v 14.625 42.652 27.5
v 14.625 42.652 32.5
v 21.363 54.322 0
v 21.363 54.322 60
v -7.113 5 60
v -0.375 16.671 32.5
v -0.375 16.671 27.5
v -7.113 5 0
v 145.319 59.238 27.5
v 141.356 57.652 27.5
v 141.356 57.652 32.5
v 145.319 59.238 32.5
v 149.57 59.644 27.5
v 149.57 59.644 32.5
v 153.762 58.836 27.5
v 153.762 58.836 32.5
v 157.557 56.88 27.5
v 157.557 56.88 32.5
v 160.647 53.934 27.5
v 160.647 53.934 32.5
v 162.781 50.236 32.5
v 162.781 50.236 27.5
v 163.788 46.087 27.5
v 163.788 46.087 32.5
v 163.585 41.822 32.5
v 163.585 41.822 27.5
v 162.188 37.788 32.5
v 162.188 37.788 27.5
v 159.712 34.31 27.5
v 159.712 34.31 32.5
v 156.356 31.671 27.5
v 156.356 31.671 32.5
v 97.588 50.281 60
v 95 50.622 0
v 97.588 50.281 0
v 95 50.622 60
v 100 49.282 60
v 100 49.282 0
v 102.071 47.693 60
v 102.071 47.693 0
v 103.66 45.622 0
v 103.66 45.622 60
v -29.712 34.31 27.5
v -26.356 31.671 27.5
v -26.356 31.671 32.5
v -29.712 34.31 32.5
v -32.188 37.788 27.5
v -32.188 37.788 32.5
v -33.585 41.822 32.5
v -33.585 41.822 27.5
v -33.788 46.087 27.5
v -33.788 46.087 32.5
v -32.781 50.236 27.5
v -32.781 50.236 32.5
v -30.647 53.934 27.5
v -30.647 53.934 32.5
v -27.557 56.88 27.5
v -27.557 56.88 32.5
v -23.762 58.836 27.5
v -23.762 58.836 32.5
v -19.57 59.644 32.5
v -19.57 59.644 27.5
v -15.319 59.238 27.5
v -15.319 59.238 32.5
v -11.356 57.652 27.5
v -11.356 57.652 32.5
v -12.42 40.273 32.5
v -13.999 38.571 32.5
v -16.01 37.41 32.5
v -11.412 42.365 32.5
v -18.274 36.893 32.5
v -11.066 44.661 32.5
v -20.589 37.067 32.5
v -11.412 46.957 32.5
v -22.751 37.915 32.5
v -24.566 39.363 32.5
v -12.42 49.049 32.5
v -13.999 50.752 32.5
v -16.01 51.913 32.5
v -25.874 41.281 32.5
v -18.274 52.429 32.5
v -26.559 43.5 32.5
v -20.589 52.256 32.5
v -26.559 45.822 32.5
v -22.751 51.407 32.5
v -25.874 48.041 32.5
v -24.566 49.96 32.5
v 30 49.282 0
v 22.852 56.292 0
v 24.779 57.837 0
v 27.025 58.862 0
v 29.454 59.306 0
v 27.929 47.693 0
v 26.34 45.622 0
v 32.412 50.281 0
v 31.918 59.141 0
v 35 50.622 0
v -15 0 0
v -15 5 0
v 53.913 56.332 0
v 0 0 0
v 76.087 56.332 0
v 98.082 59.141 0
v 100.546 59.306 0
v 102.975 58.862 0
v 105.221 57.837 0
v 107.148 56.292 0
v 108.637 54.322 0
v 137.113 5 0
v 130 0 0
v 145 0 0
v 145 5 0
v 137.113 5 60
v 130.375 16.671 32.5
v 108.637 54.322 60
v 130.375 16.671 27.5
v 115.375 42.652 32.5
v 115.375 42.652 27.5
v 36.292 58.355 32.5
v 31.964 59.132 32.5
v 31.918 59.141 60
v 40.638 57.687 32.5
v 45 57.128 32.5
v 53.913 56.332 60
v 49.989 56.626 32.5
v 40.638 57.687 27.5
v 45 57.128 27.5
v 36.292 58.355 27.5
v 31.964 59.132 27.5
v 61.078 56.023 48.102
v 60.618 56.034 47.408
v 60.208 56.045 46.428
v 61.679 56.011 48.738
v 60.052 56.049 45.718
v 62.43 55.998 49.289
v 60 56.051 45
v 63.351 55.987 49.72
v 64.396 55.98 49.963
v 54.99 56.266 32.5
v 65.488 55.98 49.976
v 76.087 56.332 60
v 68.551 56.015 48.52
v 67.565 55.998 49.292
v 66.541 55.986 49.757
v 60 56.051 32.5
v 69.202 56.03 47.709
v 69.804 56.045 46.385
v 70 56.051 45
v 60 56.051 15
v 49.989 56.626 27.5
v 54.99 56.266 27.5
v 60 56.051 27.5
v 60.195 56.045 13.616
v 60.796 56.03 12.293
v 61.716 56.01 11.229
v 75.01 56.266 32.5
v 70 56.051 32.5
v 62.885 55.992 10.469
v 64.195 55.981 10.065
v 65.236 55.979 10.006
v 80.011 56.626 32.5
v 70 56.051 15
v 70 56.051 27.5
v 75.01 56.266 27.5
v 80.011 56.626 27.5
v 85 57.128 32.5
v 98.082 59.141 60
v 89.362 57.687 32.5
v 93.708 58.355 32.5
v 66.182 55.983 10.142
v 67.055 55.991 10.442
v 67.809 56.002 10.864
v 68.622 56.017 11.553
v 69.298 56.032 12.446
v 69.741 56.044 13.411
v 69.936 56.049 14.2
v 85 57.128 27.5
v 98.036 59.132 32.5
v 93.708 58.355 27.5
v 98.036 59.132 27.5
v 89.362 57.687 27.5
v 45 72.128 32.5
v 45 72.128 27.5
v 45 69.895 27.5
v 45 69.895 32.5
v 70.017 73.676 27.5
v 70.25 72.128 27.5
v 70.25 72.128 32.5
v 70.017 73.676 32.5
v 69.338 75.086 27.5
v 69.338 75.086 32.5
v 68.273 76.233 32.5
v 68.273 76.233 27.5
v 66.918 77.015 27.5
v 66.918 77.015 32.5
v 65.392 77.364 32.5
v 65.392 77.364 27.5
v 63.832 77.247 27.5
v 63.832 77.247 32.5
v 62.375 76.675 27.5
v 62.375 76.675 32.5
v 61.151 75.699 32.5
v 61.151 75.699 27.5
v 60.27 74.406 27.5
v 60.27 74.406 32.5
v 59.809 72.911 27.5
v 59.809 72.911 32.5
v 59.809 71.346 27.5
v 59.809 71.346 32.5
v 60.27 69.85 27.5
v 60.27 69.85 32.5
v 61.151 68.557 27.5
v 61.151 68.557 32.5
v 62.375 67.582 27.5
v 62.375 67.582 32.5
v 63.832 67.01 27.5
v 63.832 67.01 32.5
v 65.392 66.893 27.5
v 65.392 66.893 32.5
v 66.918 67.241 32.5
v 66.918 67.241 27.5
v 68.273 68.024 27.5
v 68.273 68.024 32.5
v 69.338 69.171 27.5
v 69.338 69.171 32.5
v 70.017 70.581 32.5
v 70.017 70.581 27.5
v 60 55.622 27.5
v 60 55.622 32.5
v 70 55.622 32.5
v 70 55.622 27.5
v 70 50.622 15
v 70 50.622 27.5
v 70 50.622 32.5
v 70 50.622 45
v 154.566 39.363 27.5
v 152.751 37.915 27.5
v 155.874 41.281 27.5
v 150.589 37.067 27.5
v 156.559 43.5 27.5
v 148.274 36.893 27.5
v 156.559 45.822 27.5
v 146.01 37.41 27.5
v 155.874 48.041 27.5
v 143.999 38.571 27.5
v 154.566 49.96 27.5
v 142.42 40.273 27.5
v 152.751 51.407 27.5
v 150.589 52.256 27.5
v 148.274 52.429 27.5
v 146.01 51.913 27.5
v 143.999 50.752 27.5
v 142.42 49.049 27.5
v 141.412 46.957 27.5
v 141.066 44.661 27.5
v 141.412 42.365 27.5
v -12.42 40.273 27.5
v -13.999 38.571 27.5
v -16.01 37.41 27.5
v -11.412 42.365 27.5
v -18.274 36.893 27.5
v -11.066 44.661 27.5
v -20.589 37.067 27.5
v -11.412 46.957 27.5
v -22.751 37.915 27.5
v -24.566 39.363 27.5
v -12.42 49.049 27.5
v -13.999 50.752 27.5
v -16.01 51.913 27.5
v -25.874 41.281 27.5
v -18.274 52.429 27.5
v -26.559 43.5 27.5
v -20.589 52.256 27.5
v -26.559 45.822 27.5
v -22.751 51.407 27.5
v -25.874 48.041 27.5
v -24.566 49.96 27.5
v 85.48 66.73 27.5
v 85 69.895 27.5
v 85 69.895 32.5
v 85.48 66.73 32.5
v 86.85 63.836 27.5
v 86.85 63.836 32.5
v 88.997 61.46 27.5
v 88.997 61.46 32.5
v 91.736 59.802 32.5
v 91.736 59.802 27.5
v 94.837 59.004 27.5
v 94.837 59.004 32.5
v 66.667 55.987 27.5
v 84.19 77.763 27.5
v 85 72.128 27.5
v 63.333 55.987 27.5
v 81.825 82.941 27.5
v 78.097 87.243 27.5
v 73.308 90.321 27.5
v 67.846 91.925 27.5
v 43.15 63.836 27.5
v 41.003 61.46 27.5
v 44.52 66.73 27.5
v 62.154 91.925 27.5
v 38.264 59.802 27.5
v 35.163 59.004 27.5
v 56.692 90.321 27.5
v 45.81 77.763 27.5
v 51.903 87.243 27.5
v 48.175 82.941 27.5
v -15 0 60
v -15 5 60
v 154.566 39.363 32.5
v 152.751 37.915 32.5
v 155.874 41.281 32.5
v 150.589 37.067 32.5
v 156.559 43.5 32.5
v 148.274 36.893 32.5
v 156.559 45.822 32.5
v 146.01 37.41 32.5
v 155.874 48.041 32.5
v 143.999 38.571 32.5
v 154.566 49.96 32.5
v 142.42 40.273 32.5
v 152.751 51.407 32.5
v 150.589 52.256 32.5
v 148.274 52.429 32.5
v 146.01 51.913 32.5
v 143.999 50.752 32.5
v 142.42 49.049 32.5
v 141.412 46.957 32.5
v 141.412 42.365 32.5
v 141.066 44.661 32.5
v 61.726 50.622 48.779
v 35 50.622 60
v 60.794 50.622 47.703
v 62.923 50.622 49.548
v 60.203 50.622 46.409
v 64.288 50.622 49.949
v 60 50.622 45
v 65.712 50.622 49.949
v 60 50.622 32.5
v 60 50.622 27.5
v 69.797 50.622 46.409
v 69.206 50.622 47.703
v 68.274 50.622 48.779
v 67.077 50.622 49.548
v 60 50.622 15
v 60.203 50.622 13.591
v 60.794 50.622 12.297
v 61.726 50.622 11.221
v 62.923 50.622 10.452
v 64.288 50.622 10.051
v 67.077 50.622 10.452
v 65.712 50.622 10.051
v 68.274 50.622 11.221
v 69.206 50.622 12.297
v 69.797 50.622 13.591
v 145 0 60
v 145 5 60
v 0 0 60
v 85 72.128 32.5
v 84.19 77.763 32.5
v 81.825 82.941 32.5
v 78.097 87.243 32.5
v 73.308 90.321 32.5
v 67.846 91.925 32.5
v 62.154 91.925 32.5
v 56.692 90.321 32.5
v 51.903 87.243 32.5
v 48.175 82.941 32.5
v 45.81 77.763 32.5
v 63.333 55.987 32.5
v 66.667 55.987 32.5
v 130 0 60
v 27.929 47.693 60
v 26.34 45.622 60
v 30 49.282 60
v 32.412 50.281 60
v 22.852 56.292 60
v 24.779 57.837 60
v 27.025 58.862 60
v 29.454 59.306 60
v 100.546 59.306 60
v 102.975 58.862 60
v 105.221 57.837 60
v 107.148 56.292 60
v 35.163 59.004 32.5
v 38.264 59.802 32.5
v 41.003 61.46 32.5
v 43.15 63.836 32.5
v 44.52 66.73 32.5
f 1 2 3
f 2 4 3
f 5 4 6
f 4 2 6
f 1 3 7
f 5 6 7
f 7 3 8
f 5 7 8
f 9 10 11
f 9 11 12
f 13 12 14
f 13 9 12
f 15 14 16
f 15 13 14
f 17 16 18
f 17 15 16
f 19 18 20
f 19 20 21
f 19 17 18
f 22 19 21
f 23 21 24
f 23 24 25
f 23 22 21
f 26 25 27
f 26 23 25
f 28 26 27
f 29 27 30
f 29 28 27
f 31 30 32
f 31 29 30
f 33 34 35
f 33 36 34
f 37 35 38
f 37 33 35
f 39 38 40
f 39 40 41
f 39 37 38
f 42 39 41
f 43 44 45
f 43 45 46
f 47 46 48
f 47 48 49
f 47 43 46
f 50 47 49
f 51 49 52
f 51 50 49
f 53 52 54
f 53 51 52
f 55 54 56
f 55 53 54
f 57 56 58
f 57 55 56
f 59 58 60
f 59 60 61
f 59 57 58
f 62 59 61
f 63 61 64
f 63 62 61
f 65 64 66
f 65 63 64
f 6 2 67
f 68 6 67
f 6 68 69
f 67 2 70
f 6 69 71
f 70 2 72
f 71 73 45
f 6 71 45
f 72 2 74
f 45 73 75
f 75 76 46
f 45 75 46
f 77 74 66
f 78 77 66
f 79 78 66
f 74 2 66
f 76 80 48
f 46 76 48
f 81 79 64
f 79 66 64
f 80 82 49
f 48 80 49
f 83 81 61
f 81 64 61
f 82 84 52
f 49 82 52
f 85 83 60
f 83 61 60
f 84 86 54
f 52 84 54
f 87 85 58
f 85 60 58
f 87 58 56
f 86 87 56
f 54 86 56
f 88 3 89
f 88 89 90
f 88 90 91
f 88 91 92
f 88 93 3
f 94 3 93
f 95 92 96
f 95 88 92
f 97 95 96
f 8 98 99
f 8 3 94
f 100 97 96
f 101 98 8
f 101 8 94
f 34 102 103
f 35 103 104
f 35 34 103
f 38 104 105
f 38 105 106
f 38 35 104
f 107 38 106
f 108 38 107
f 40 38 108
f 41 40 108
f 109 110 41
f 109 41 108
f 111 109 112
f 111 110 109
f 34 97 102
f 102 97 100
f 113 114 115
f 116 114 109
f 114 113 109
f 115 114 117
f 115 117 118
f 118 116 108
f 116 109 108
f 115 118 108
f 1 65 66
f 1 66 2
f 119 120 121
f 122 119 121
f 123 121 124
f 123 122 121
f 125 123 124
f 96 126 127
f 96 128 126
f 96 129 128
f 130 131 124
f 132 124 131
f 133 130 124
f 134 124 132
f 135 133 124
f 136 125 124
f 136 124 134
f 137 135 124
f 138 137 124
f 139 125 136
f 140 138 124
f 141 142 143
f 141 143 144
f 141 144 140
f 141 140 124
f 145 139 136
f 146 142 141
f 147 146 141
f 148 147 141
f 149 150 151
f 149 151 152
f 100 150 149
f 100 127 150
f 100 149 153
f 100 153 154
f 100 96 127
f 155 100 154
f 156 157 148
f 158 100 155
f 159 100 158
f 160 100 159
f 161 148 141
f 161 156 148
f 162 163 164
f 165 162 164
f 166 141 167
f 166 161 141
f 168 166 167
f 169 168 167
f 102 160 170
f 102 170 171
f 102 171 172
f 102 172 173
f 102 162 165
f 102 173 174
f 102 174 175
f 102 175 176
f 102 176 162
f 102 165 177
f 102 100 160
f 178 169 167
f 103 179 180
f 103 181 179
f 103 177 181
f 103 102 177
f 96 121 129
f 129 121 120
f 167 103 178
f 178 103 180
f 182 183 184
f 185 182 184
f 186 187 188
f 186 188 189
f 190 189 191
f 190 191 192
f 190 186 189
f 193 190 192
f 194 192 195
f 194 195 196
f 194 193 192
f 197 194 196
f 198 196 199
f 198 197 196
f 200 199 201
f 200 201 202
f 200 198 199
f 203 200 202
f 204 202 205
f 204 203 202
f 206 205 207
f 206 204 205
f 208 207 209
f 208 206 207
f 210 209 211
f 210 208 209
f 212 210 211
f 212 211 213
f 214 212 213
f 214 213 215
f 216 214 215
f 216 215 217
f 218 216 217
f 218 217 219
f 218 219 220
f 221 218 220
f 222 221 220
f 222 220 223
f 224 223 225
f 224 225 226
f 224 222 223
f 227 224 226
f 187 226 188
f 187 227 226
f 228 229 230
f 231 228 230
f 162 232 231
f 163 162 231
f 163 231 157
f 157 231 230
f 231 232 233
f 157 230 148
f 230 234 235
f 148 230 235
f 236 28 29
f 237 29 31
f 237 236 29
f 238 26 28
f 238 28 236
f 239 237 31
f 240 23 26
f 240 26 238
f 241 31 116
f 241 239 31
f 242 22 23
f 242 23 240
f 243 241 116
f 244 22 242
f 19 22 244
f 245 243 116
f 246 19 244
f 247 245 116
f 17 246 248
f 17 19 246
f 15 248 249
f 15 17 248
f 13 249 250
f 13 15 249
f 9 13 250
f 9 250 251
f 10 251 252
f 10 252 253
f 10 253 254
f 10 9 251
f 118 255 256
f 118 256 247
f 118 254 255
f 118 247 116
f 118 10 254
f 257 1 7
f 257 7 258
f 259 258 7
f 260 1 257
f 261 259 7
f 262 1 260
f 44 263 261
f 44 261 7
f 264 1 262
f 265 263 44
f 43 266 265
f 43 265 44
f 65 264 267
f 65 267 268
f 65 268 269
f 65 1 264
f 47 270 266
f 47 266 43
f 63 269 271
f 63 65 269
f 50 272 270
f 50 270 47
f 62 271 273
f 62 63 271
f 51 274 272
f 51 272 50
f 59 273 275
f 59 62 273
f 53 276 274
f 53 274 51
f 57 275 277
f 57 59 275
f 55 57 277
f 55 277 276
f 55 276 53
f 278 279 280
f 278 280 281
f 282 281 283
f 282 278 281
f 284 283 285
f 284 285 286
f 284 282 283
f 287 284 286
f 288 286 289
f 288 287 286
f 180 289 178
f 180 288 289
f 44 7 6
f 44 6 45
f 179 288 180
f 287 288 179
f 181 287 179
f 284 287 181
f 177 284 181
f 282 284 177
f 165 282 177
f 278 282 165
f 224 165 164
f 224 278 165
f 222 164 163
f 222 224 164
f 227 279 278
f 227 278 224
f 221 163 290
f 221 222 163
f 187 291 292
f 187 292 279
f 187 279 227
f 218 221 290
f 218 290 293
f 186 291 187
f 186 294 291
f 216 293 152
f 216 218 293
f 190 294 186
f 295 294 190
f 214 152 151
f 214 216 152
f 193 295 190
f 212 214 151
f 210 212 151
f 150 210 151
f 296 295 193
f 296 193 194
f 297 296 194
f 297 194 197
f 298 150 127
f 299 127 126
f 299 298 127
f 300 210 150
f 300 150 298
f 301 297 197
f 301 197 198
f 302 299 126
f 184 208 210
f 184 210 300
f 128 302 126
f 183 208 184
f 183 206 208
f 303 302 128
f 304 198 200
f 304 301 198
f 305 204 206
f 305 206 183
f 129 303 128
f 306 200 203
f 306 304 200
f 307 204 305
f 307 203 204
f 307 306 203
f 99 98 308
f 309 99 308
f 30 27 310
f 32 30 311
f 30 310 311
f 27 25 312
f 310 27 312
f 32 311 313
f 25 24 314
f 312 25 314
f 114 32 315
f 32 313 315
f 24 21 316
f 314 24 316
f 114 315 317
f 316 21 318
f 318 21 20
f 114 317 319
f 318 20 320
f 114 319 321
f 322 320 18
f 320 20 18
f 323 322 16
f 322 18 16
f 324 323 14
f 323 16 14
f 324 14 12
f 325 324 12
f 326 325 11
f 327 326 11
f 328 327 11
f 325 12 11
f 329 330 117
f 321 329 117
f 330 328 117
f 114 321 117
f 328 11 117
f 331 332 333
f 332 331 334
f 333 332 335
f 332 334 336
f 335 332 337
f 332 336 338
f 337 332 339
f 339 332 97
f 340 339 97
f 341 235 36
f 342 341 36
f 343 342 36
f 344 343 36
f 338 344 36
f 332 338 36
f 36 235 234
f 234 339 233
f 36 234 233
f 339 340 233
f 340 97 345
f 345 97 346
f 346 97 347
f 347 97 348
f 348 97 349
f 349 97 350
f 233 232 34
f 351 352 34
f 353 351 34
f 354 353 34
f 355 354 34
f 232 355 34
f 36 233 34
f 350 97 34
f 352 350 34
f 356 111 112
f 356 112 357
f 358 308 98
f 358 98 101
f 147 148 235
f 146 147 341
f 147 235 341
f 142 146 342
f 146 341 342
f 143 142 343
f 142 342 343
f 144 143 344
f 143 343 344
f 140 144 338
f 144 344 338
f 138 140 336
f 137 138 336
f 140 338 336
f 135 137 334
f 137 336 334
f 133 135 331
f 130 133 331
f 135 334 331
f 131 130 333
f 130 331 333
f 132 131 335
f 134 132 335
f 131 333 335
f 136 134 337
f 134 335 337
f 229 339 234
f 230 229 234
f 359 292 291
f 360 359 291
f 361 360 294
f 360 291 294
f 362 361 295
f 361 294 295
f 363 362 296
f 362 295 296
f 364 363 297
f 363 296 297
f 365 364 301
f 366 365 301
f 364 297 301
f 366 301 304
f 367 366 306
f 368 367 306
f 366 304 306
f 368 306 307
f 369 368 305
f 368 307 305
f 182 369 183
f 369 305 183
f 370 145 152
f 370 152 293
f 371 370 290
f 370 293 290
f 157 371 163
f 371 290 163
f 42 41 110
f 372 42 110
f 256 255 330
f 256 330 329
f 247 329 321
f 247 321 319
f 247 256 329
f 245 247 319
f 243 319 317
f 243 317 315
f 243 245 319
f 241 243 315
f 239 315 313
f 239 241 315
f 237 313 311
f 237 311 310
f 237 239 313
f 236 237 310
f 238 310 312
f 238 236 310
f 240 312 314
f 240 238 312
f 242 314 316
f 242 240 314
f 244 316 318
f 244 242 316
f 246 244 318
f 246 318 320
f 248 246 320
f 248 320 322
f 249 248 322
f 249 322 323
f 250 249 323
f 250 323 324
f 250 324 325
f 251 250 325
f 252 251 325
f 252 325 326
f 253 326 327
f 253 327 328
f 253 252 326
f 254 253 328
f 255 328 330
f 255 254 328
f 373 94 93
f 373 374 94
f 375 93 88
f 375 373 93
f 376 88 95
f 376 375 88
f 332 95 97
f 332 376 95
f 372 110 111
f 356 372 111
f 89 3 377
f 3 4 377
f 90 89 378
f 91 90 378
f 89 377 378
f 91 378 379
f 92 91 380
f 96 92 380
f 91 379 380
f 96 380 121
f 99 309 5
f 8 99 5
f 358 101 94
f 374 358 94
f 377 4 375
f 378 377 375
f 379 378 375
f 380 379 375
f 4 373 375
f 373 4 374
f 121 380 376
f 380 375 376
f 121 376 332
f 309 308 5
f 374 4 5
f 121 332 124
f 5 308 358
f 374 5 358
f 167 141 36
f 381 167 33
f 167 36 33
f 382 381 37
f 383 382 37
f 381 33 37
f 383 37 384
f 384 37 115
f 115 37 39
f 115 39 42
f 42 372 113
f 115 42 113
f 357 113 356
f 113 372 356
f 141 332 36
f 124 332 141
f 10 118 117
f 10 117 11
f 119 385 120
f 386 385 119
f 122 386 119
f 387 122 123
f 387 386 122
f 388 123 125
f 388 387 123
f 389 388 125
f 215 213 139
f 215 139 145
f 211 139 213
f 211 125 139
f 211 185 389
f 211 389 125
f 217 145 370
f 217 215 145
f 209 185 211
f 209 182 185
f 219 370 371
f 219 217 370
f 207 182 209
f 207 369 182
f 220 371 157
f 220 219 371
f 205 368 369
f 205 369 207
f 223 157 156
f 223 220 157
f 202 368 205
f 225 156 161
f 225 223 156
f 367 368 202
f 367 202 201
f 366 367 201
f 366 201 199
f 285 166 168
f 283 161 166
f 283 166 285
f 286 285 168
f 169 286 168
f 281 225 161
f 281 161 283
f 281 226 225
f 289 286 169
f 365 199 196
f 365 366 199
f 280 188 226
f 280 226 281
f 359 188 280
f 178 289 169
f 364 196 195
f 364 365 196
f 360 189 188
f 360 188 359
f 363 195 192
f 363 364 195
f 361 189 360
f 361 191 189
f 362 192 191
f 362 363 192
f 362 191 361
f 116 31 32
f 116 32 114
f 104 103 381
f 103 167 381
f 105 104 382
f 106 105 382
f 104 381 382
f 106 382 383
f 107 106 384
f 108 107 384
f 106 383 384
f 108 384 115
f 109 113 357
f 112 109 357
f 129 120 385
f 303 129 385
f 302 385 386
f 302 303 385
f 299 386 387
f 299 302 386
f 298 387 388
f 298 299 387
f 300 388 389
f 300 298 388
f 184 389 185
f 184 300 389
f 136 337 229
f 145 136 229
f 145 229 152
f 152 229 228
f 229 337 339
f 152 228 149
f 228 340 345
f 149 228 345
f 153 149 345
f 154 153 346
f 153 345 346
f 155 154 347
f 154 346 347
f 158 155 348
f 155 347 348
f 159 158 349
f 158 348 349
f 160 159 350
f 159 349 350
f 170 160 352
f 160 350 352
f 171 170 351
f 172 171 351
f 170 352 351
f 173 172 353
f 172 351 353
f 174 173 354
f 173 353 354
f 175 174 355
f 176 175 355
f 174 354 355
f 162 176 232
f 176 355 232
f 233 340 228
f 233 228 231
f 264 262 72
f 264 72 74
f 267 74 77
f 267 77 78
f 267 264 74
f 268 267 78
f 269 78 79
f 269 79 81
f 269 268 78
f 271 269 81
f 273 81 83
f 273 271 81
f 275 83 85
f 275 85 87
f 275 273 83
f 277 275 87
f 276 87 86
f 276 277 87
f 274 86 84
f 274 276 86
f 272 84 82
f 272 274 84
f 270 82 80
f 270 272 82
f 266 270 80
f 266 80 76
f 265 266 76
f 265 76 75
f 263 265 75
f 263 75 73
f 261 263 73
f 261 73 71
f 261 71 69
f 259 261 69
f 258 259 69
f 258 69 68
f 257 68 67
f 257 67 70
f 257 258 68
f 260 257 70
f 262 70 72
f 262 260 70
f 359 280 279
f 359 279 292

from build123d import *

# Parameters (mm, degrees)
BOSS_EXTRU_1_DEPTH      = 60
ENL_V_MAT_EXTRU_1_DEPTH = 60
CONG_1_R                = 10
ENL_V_MAT_EXTRU_2_DEPTH = 60
CONG_2_R                = 10
ESQUISSE4_W             = 15
ESQUISSE4_H             = 60
BOSS_EXTRU_2_DEPTH      = 5
BOSS_EXTRU_3_START      = -32.5
ESQUISSE5_R             = 7.789836859
ESQUISSE5_R_2           = 5.25
BOSS_EXTRU_3_DEPTH      = 5
ESQUISSE6_W             = 10
ESQUISSE6_H             = 5
BOSS_EXTRU_4_DEPTH      = 5
CONG_3_R                = 11


with BuildPart() as part:
    # Esquisse1 → Boss.-Extru.1 (new body)
    with BuildSketch(Plane.XY):
        Polygon((0, 0), (29.226497308, 50.621778265), (100.773502692, 50.621778265), (130, 0), (140, 0), (105, 60.621778265), (25, 60.621778265), (-10, 0), align=None)
    extrude(amount=BOSS_EXTRU_1_DEPTH)

    # Esquisse2 → Enlèv. mat.-Extru.1 (cut)
    with BuildSketch(Plane(origin=(0, 0, 0), x_dir=(-1, 0, 0), z_dir=(0, 0, -1))):
        with BuildLine():
            Line((-105, 60.621778265), (-25, 60.621778265))
            ThreePointArc((-25, 60.621778265), (-65, 55.979286299), (-105, 60.621778265))
        make_face()
    extrude(amount=-ENL_V_MAT_EXTRU_1_DEPTH, mode=Mode.SUBTRACT)

    # Congé1
    cong_1_edges = [part.edges().sort_by_distance(p)[0] for p in [
        (25, 60.621778265, 30),
        (105, 60.621778265, 30),
    ]]
    fillet(cong_1_edges, radius=CONG_1_R)

    # Esquisse3 → Enlèv. mat.-Extru.2 (cut)
    with BuildSketch(Plane(origin=(0, 0, 0), x_dir=(1, 0, 0), z_dir=(0, 1, 0))):
        with BuildLine():
            Line((70, -15), (70, -45))
            ThreePointArc((70, -45), (65, -50), (60, -45))
            Line((60, -45), (60, -15))
            ThreePointArc((60, -15), (65, -10), (70, -15))
        make_face()
    extrude(amount=ENL_V_MAT_EXTRU_2_DEPTH, mode=Mode.SUBTRACT)

    # Congé2
    cong_2_edges = [part.edges().sort_by_distance(p)[0] for p in [
        (100.773502692, 50.621778265, 30),
        (29.226497308, 50.621778265, 30),
    ]]
    fillet(cong_2_edges, radius=CONG_2_R)

    # Esquisse4 → Boss.-Extru.2 (add)
    with BuildSketch(Plane.XZ):
        with Locations((-7.5, 30)):
            Rectangle(ESQUISSE4_W, ESQUISSE4_H)
        with Locations((137.5, 30)):
            Rectangle(ESQUISSE4_W, ESQUISSE4_H)
    extrude(amount=-BOSS_EXTRU_2_DEPTH)

    # Esquisse5 → Boss.-Extru.3 (add)
    # profile 1 of 3: a face of its own
    with BuildSketch(Plane.XY.offset(60).offset(BOSS_EXTRU_3_START)):
        with BuildLine():
            Line((115.375109784, 42.651560984), (141.355871898, 57.651560984))
            ThreePointArc((141.355871898, 57.651560984), (161.846252955, 52.161179927), (156.355871898, 31.670798871))
            Line((156.355871898, 31.670798871), (130.375109784, 16.670798871))
            Line((130.375109784, 16.670798871), (115.375109784, 42.651560984))
        make_face()
        with Locations(Location((148.855871898, 44.661179927, 0), (0, 0, 180))):
            Circle(ESQUISSE5_R, mode=Mode.SUBTRACT)
    # profile 2 of 3: a face of its own
    with BuildSketch(Plane.XY.offset(60).offset(BOSS_EXTRU_3_START)):
        with BuildLine():
            Line((14.624890216, 42.651560984), (-0.375109784, 16.670798871))
            Line((-0.375109784, 16.670798871), (-26.355871898, 31.670798871))
            ThreePointArc((-26.355871898, 31.670798871), (-31.846252955, 52.161179927), (-11.355871898, 57.651560984))
            Line((-11.355871898, 57.651560984), (14.624890216, 42.651560984))
        make_face()
        with Locations((-18.855871898, 44.661179927)):
            Circle(ESQUISSE5_R, mode=Mode.SUBTRACT)
    # profile 3 of 3: a face of its own
    with BuildSketch(Plane.XY.offset(60).offset(BOSS_EXTRU_3_START)):
        with BuildLine():
            Line((45, 72.128262536), (45, 57.128262536))
            ThreePointArc((45, 57.128262536), (65, 55.979286299), (85, 57.128262536))
            Line((85, 57.128262536), (85, 72.128262536))
            ThreePointArc((85, 72.128262536), (65, 92.128262536), (45, 72.128262536))
        make_face()
        with Locations((65, 72.128262536)):
            Circle(ESQUISSE5_R_2, mode=Mode.SUBTRACT)
    extrude(amount=BOSS_EXTRU_3_DEPTH)

    # Esquisse6 → Boss.-Extru.4 (add)
    with BuildSketch(Plane.XZ.offset(-50.621778265)):
        with Locations((65, 30)):
            Rectangle(ESQUISSE6_W, ESQUISSE6_H)
    extrude(amount=-BOSS_EXTRU_4_DEPTH)

    # Congé3
    # the kernel refuses this fillet: 11 mm, written as the material it adds along each edge
    with BuildSketch(Plane(origin=(85, 57.128262536, 27.5), x_dir=(0.9883685049856061, 0.15207793512708467, 0), z_dir=(0, 0, 1))) as cong_3_piece_1:
        with BuildLine():
            CenterArc((12.820682636, 10.992120116), CONG_3_R, 171.25263481, 100.916203285)
            Line((1.948629081, 12.664977402), (0.861423726, 12.832263131))
            ThreePointArc((0.861423726, 12.832263131), (-0.112841396, 6.499766826), (-1.087205355, 0.167285729))
            Line((-1.087205355, 0.167285729), (-0.041678758, -1.099210117))
            ThreePointArc((-0.041678758, -1.099210117), (13.278085549, -1.099131399), (13.278598986, -1.099212012))
            Line((13.278598986, -1.099212012), (13.236970227, 0))
        make_face()
    extrude(amount=5)
    with BuildSketch(Plane(origin=(45, 57.128262536, 27.5), x_dir=(-0.9883685049856065, 0.1520779351270834, 0), z_dir=(0, 0, 1))) as cong_3_piece_2:
        with BuildLine():
            CenterArc((12.820682636, -10.992120116), CONG_3_R, 87.831161905, 100.916203285)
            Line((1.948629081, -12.664977402), (0.861423726, -12.832263131))
            ThreePointArc((0.861423726, -12.832263131), (-0.112841396, -6.499766826), (-1.087205355, -0.167285729))
            Line((-1.087205355, -0.167285729), (-0.041678758, 1.099210117))
            ThreePointArc((-0.041678758, 1.099210117), (13.278085549, 1.099131399), (13.278598986, 1.099212012))
            Line((13.278598986, 1.099212012), (13.236970227, 0))
        make_face()
    extrude(amount=5)


solid = part.part
